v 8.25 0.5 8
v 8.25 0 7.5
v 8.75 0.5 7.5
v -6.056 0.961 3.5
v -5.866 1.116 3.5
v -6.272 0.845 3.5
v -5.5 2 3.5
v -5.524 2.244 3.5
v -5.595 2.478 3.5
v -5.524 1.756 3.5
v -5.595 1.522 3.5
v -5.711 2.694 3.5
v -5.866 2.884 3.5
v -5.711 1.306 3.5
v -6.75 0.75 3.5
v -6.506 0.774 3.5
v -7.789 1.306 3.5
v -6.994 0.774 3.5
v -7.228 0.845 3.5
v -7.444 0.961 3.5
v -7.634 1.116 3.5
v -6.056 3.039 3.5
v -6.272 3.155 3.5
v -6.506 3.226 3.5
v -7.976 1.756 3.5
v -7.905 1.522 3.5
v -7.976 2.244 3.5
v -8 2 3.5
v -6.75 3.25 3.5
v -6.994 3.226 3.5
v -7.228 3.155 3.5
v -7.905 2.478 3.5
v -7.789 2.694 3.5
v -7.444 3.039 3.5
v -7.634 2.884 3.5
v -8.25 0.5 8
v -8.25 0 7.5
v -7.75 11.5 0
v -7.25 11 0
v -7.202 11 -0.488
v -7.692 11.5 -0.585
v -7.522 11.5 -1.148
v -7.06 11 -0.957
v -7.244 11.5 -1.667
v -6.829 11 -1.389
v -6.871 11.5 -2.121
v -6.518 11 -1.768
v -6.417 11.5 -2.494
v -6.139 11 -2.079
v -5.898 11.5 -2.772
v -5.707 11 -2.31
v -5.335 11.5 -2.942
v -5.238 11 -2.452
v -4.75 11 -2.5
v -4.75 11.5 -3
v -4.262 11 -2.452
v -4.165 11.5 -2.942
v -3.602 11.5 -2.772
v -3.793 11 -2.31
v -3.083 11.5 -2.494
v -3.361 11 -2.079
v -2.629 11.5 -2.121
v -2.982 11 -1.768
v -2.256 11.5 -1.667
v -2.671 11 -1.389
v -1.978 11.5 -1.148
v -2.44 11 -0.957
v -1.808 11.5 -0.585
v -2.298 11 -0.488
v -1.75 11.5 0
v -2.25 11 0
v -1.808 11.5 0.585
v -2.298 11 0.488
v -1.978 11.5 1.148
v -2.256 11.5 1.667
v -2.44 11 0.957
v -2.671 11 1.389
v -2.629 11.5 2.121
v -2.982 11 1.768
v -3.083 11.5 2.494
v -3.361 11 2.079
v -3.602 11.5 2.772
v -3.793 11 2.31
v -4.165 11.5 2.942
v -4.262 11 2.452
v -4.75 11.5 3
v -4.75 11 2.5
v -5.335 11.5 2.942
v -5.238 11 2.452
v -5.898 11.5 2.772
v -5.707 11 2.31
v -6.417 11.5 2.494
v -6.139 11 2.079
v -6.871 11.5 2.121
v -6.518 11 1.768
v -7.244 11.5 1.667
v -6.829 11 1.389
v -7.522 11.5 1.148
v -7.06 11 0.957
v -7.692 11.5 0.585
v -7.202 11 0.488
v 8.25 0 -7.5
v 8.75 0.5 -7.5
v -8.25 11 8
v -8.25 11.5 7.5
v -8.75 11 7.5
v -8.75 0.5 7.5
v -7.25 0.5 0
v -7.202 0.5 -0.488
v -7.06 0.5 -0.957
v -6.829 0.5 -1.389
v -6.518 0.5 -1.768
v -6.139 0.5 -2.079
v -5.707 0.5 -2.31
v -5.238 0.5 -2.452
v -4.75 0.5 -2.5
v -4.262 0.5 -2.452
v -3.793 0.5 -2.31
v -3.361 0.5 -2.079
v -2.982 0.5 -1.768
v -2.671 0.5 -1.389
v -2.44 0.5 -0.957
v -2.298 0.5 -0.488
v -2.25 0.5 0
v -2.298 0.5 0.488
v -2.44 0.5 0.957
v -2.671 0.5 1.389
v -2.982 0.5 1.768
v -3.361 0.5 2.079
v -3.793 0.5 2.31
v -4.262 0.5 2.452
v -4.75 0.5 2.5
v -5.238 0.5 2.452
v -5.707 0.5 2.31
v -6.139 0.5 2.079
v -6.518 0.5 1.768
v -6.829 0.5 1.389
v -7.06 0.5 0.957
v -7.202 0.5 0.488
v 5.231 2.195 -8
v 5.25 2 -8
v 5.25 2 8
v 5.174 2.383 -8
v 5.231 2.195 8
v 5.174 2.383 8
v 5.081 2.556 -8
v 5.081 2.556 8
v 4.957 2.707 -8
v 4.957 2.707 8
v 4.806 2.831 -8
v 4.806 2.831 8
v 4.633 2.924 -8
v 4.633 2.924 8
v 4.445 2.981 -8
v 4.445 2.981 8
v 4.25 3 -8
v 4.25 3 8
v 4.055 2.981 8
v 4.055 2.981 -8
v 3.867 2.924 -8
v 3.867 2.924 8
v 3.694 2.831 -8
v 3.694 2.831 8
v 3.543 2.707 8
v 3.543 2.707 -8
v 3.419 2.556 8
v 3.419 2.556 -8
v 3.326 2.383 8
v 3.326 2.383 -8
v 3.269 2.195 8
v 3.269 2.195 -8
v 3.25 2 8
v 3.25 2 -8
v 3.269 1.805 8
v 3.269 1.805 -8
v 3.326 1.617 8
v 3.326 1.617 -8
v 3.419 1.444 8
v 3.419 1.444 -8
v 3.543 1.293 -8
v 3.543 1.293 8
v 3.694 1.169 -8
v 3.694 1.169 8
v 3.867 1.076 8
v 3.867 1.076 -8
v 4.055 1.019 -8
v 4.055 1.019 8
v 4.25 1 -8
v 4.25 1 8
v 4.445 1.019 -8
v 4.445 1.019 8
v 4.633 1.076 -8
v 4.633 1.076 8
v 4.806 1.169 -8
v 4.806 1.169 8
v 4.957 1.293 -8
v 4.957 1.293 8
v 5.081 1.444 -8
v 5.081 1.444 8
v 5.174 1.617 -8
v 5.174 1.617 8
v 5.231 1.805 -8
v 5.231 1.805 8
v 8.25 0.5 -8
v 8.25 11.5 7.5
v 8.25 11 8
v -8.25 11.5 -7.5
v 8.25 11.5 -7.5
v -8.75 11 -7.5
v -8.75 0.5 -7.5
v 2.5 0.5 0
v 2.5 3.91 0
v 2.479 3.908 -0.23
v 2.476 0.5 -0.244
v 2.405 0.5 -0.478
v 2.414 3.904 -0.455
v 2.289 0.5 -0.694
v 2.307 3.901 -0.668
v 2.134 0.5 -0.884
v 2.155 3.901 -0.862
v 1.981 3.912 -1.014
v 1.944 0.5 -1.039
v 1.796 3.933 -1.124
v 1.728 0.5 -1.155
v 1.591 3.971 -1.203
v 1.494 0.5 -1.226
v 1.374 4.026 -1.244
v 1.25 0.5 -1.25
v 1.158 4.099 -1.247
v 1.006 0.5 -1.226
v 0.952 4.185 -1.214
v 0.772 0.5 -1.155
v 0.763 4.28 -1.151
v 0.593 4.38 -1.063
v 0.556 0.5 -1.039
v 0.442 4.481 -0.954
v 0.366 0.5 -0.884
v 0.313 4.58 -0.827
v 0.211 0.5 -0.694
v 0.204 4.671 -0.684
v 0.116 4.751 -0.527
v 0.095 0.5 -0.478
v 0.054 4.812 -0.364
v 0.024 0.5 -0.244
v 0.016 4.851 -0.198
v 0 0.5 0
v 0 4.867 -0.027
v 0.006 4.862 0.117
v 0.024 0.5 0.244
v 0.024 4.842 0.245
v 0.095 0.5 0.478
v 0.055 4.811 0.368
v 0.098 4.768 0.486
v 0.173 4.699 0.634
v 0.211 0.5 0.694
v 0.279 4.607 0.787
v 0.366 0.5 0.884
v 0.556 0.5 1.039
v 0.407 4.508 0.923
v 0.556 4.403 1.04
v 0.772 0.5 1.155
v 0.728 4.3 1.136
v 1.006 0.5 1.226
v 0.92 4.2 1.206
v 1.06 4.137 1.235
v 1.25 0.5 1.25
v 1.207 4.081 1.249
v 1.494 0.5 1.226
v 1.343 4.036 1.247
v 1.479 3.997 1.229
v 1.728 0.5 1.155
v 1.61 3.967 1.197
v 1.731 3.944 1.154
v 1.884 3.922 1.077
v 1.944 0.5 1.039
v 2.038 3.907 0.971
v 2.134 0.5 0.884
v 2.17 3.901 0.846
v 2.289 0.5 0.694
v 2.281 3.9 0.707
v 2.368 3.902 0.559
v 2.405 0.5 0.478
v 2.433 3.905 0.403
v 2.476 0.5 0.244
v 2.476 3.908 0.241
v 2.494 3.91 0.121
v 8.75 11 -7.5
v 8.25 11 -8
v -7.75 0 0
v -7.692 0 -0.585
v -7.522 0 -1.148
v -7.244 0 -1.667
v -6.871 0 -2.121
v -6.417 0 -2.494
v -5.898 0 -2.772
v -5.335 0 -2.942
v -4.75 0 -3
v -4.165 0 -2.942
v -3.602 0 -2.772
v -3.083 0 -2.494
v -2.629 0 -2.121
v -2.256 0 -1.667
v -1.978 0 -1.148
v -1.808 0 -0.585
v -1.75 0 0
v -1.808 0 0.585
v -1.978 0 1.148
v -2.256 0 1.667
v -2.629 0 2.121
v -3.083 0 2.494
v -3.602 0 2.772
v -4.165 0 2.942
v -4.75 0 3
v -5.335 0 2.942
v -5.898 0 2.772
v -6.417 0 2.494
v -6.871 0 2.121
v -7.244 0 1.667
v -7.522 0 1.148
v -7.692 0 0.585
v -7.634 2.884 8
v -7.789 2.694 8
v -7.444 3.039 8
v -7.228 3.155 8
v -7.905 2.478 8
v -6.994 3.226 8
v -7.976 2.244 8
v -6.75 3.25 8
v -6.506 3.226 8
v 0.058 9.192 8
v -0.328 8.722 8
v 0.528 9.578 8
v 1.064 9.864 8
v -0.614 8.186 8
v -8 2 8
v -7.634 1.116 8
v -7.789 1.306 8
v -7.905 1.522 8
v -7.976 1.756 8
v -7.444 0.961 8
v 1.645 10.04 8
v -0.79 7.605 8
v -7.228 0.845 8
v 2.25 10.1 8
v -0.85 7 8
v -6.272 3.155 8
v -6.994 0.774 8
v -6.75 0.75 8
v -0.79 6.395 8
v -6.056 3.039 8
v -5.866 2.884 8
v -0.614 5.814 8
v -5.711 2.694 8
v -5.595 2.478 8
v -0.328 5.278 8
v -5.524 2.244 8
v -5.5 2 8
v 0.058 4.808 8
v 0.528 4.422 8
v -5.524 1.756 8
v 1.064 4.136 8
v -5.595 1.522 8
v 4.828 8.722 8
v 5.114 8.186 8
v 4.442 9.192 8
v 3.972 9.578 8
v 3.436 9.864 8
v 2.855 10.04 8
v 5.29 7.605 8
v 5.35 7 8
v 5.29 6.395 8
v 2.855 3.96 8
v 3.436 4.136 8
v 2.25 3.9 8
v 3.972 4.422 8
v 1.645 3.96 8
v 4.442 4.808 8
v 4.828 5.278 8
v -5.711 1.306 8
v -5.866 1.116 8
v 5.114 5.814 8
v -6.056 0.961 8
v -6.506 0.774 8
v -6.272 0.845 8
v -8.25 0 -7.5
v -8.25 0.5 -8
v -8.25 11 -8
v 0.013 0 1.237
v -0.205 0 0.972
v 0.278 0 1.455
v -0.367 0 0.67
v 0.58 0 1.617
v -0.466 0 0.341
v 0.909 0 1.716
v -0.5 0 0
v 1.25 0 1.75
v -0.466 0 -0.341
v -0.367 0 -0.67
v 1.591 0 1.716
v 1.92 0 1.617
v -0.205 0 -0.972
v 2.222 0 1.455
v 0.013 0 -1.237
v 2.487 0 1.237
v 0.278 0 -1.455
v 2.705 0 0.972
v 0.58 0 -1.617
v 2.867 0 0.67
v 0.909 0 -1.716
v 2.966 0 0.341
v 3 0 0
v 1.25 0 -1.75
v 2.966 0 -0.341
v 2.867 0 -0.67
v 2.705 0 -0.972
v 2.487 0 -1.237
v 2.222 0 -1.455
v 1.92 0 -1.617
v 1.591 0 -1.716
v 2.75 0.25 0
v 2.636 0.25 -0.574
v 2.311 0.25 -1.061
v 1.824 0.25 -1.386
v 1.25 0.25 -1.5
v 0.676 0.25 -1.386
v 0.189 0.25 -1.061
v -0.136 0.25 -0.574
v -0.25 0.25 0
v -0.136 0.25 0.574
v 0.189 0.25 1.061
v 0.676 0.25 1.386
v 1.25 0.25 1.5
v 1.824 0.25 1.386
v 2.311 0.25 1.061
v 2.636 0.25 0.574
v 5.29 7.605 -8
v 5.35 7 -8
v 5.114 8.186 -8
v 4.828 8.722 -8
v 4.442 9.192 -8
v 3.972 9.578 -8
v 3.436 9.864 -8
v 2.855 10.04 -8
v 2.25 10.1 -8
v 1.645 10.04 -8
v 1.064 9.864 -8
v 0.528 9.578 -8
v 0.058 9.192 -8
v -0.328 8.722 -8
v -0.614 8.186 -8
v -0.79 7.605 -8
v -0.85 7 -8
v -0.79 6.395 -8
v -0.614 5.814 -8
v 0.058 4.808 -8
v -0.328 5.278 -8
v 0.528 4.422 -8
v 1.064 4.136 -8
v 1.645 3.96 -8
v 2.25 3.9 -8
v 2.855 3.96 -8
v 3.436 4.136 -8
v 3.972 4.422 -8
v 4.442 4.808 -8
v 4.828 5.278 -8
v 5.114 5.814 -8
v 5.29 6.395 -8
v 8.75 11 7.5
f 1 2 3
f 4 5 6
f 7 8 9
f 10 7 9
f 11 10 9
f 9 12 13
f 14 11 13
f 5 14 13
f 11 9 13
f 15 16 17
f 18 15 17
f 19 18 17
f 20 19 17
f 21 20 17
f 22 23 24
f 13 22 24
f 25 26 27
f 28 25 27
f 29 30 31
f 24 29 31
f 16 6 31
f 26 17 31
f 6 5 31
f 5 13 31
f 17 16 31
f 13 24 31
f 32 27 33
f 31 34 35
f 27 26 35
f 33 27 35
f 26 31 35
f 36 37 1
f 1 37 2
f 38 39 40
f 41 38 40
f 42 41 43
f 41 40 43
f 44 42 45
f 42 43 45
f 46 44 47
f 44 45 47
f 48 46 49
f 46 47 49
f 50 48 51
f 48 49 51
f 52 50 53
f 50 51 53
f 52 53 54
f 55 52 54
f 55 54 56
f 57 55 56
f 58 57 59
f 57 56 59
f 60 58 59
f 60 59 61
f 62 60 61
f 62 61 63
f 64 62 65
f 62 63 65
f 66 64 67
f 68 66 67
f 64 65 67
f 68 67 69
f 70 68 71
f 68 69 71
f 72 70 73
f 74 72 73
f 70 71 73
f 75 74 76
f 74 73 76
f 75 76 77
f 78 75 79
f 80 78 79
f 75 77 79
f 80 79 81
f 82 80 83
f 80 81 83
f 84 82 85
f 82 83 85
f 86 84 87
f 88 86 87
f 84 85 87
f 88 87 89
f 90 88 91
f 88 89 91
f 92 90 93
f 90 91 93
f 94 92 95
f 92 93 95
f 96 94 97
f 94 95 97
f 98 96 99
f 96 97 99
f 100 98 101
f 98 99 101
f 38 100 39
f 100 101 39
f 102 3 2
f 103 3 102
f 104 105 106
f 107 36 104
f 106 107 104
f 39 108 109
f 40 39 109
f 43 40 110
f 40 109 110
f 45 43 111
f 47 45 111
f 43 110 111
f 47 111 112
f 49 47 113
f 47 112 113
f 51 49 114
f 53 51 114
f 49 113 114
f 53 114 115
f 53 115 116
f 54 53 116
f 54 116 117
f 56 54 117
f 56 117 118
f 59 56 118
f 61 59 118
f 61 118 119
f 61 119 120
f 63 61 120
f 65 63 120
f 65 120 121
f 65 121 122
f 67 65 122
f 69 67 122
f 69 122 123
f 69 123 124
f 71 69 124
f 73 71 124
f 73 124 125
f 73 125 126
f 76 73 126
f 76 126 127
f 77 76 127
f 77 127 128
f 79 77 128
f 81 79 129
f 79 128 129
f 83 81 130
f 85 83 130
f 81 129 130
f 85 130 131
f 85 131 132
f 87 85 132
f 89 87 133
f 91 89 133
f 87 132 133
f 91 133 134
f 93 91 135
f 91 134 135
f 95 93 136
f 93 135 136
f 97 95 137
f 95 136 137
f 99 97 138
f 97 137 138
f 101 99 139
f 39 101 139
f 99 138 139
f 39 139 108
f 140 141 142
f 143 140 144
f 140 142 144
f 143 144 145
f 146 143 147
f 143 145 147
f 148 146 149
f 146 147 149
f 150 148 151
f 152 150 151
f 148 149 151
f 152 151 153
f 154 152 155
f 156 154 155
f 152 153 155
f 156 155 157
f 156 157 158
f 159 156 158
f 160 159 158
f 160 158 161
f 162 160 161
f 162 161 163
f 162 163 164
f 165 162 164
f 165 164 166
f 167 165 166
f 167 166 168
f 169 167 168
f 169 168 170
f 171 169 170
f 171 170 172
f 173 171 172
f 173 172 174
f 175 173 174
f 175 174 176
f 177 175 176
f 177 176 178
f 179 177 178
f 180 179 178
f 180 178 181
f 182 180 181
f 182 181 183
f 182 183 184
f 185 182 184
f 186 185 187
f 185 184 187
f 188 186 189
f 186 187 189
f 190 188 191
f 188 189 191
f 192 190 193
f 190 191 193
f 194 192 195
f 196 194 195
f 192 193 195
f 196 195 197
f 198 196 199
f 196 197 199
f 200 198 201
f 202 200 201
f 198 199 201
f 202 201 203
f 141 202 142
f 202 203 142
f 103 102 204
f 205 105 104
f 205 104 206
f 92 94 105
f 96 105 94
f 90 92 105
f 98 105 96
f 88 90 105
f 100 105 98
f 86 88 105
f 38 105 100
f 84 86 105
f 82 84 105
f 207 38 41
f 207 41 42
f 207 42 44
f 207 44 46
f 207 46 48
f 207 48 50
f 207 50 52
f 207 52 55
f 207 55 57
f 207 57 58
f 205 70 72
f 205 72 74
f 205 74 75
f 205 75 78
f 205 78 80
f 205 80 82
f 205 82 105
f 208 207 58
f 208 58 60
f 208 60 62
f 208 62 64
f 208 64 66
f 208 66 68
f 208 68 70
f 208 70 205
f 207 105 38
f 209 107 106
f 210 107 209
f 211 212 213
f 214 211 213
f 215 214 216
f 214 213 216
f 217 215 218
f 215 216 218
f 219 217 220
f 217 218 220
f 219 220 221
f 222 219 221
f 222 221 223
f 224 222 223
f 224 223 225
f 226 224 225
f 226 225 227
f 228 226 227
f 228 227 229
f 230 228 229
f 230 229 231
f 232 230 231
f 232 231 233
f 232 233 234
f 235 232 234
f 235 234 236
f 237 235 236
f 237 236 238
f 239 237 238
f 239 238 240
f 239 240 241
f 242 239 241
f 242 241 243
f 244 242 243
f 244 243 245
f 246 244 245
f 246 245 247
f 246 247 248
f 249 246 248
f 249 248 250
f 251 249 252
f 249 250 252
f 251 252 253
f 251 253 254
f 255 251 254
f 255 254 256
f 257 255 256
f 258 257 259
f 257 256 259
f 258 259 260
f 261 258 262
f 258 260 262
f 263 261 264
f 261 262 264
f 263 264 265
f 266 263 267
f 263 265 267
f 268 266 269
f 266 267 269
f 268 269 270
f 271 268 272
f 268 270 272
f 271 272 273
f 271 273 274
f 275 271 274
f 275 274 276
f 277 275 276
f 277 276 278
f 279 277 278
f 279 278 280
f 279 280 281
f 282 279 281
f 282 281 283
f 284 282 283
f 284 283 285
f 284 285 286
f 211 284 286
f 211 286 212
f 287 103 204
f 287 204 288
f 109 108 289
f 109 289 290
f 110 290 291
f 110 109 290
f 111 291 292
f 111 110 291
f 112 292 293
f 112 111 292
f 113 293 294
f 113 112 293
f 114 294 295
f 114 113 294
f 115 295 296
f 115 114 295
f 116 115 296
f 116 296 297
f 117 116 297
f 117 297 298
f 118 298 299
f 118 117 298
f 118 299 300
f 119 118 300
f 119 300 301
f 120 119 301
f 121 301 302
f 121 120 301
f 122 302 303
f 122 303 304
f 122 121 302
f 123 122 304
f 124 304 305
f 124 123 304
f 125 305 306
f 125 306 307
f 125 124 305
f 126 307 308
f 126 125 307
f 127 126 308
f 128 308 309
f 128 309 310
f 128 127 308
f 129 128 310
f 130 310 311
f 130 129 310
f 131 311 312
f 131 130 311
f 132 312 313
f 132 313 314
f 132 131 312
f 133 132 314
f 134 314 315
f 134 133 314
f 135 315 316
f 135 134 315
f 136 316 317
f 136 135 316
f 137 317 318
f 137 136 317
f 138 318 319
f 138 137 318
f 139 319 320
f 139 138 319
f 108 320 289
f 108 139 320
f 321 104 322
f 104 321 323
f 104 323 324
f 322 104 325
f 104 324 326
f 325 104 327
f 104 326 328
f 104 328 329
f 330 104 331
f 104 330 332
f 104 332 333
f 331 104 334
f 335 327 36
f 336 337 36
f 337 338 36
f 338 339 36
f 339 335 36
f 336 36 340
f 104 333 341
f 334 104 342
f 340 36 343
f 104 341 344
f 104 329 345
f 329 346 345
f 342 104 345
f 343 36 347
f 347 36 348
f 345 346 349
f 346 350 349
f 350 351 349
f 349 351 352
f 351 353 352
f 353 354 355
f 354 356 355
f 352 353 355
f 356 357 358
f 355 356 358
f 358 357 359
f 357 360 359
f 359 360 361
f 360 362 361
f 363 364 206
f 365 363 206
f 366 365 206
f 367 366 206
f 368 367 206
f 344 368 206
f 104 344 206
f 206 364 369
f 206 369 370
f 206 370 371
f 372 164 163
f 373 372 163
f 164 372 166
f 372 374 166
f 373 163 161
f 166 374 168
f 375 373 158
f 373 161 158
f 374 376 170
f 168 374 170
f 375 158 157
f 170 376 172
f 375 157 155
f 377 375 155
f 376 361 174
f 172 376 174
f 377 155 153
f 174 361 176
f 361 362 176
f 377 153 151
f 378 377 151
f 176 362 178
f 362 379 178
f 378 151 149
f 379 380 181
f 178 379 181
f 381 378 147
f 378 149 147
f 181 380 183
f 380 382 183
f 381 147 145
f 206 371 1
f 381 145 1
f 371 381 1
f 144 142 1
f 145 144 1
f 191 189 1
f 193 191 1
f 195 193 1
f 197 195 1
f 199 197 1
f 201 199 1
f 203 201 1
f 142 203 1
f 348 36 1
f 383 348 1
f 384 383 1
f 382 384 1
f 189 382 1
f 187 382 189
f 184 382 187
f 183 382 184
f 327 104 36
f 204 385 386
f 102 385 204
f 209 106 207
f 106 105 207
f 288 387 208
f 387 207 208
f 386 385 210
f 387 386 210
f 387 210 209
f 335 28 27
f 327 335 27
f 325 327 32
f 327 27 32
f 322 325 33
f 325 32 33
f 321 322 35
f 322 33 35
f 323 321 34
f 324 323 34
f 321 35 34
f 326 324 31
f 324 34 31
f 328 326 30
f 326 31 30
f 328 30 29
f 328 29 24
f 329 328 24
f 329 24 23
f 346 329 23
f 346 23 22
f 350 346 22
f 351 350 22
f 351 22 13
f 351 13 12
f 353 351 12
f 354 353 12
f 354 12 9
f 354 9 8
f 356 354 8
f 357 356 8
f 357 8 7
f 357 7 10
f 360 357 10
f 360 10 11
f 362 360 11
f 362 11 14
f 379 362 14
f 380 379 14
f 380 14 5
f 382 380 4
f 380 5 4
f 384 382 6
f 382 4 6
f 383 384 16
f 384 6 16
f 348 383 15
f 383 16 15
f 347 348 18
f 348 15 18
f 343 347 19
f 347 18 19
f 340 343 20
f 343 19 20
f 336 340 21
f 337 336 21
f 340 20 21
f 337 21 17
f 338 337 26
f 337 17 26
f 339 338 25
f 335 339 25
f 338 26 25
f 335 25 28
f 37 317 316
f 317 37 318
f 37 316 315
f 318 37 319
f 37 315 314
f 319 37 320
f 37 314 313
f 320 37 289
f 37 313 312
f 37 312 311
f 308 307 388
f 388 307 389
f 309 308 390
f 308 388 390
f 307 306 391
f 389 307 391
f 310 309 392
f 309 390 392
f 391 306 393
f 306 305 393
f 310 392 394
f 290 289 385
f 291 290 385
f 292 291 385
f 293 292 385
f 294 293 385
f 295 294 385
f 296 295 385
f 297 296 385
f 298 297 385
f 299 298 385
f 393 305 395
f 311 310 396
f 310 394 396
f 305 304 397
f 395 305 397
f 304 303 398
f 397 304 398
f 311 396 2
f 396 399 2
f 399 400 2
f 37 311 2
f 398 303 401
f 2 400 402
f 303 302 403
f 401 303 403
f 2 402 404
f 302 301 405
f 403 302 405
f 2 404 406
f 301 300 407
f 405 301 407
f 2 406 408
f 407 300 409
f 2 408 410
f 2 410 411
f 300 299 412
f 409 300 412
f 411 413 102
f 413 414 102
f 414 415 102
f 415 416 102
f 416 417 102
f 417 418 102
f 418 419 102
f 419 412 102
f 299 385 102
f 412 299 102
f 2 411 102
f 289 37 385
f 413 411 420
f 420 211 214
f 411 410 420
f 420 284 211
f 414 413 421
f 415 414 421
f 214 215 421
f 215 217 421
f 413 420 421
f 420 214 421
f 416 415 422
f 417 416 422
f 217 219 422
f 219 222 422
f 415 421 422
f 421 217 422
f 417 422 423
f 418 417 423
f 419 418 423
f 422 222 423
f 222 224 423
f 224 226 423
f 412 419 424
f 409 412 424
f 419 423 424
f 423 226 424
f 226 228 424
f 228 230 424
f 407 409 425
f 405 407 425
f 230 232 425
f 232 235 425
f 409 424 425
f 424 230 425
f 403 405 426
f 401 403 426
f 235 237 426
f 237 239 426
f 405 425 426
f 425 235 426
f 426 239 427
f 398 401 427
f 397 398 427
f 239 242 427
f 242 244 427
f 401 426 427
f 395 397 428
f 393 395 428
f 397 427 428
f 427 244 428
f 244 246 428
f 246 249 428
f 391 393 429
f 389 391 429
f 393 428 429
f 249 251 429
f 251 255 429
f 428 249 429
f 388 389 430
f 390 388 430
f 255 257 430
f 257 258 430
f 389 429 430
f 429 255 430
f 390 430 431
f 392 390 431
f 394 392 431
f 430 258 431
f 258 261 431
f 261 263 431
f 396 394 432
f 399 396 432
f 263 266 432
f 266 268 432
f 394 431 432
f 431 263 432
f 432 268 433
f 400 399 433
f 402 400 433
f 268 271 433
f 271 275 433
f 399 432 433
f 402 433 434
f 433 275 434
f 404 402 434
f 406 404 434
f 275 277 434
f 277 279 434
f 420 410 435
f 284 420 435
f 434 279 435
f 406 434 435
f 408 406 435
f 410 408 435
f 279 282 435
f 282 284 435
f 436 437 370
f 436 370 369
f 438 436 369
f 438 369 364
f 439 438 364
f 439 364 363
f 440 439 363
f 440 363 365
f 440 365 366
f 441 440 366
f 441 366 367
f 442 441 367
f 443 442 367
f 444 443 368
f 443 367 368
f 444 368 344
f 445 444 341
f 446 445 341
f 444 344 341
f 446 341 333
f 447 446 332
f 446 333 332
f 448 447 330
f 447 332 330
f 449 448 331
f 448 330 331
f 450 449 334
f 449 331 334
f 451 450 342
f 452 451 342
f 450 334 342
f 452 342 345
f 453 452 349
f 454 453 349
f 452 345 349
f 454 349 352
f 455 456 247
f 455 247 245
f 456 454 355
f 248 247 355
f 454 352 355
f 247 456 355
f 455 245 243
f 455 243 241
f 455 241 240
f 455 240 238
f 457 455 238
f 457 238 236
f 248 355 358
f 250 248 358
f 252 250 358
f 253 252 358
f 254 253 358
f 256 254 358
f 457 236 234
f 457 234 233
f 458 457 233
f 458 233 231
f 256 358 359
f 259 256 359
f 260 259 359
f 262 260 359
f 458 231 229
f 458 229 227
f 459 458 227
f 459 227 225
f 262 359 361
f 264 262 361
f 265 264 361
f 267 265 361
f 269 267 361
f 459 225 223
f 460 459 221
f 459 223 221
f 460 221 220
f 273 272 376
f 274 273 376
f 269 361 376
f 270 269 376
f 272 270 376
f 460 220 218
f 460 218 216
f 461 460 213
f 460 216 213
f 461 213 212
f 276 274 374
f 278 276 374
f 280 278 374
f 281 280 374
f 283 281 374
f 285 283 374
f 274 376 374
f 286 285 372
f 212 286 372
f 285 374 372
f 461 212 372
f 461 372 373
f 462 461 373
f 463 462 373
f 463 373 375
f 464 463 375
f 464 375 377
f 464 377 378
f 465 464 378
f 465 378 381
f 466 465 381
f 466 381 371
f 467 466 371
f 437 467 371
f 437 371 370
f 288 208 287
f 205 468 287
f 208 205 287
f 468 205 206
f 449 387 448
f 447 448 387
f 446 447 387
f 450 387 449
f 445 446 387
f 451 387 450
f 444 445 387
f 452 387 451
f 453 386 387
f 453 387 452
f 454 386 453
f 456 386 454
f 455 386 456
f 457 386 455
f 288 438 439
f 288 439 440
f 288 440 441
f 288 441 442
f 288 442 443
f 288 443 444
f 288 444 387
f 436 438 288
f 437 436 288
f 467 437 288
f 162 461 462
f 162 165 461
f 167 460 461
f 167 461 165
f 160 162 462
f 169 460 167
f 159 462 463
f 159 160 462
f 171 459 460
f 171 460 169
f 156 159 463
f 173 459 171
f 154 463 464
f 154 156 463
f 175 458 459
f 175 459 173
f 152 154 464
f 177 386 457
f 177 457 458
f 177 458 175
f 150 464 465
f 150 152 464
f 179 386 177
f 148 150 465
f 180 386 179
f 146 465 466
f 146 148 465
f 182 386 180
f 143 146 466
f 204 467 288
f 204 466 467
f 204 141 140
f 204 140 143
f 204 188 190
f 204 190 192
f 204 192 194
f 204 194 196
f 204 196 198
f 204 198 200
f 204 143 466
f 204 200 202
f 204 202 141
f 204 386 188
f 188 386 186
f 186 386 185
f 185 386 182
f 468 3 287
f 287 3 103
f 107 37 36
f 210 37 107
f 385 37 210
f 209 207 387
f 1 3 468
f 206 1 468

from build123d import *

# Parameters (mm, degrees)
SKETCH1_W                       = 17.5
SKETCH1_H                       = 16
BOSS_EXTRUDE1_DEPTH             = 11.5
SKETCH2_R                       = 3.1
SKETCH2_R_2                     = 1
CUT_EXTRUDE1_DEPTH              = 17
F_2_5_2_5_DIAMETER_HOLE1_D      = 2.5
F_2_5_2_5_DIAMETER_HOLE1_DEPTH  = 4.5
TAP_DRILL_FOR_M6X1_0_TAP1_D     = 5
TAP_DRILL_FOR_M3X0_5_TAP1_D     = 2.5
TAP_DRILL_FOR_M3X0_5_TAP1_DEPTH = 6.999
TAP_DRILL_FOR_M3X0_5_TAP1_TIP   = 0.751075774
CHAMFER1_SIZE                   = 0.5


with BuildPart() as part:
    # Sketch1 → Boss-Extrude1 (new body)
    with BuildSketch(Plane(origin=(0, 0, 0), x_dir=(1, 0, 0), z_dir=(0, 1, 0))):
        Rectangle(SKETCH1_W, SKETCH1_H)
    extrude(amount=BOSS_EXTRUDE1_DEPTH)

    # Sketch2 → Cut-Extrude1 (cut, through all)
    with BuildSketch(Plane.XY.offset(8)):
        with Locations((2.25, 7)):
            Circle(SKETCH2_R)
        with Locations((4.25, 2)):
            Circle(SKETCH2_R_2)
    extrude(amount=-CUT_EXTRUDE1_DEPTH, mode=Mode.SUBTRACT)

    # Ø2.5 (2.5) Diameter Hole1
    with Locations(Plane.XY.offset(8)):
        with Locations((-6.75, 2)):
            Hole(F_2_5_2_5_DIAMETER_HOLE1_D / 2, depth=F_2_5_2_5_DIAMETER_HOLE1_DEPTH)

    # Tap Drill for M6x1.0 Tap1 (through all)
    with Locations(Plane(origin=(0, 11.5, 0), x_dir=(1, 0, 0), z_dir=(0, 1, 0))):
        with Locations((-4.75, 0)):
            Hole(TAP_DRILL_FOR_M6X1_0_TAP1_D / 2)

    # Tap Drill for M3x0.5 Tap1
    with Locations(Plane(origin=(0, 0, 0), x_dir=(-1, 0, 0), z_dir=(0, -1, 0))):
        with Locations((-1.25, 0)):
            Hole(TAP_DRILL_FOR_M3X0_5_TAP1_D / 2, depth=TAP_DRILL_FOR_M3X0_5_TAP1_DEPTH)
            with Locations((0, 0, -(TAP_DRILL_FOR_M3X0_5_TAP1_DEPTH + TAP_DRILL_FOR_M3X0_5_TAP1_TIP / 2))):  # 118° drill point
                Cone(0, TAP_DRILL_FOR_M3X0_5_TAP1_D / 2, TAP_DRILL_FOR_M3X0_5_TAP1_TIP, mode=Mode.SUBTRACT)

    # Chamfer1
    chamfer1_edges = [part.edges().sort_by_distance(p)[0] for p in [
        (0, 11.5, -8),
        (-8.75, 11.5, 0),
        (-2.25, 11.5, 0),
        (-2.25, 0, 0),
        (0, 0, 0),
        (0, 11.5, 8),
        (-8.75, 0, 0),
        (0, 0, -8),
        (8.75, 0, 0),
        (0, 0, 8),
        (8.75, 11.5, 0),
        (-8.75, 5.75, 8),
        (-8.75, 5.75, -8),
        (8.75, 5.75, -8),
        (8.75, 5.75, 8),
    ]]
    chamfer(chamfer1_edges, length=CHAMFER1_SIZE)


solid = part.part
